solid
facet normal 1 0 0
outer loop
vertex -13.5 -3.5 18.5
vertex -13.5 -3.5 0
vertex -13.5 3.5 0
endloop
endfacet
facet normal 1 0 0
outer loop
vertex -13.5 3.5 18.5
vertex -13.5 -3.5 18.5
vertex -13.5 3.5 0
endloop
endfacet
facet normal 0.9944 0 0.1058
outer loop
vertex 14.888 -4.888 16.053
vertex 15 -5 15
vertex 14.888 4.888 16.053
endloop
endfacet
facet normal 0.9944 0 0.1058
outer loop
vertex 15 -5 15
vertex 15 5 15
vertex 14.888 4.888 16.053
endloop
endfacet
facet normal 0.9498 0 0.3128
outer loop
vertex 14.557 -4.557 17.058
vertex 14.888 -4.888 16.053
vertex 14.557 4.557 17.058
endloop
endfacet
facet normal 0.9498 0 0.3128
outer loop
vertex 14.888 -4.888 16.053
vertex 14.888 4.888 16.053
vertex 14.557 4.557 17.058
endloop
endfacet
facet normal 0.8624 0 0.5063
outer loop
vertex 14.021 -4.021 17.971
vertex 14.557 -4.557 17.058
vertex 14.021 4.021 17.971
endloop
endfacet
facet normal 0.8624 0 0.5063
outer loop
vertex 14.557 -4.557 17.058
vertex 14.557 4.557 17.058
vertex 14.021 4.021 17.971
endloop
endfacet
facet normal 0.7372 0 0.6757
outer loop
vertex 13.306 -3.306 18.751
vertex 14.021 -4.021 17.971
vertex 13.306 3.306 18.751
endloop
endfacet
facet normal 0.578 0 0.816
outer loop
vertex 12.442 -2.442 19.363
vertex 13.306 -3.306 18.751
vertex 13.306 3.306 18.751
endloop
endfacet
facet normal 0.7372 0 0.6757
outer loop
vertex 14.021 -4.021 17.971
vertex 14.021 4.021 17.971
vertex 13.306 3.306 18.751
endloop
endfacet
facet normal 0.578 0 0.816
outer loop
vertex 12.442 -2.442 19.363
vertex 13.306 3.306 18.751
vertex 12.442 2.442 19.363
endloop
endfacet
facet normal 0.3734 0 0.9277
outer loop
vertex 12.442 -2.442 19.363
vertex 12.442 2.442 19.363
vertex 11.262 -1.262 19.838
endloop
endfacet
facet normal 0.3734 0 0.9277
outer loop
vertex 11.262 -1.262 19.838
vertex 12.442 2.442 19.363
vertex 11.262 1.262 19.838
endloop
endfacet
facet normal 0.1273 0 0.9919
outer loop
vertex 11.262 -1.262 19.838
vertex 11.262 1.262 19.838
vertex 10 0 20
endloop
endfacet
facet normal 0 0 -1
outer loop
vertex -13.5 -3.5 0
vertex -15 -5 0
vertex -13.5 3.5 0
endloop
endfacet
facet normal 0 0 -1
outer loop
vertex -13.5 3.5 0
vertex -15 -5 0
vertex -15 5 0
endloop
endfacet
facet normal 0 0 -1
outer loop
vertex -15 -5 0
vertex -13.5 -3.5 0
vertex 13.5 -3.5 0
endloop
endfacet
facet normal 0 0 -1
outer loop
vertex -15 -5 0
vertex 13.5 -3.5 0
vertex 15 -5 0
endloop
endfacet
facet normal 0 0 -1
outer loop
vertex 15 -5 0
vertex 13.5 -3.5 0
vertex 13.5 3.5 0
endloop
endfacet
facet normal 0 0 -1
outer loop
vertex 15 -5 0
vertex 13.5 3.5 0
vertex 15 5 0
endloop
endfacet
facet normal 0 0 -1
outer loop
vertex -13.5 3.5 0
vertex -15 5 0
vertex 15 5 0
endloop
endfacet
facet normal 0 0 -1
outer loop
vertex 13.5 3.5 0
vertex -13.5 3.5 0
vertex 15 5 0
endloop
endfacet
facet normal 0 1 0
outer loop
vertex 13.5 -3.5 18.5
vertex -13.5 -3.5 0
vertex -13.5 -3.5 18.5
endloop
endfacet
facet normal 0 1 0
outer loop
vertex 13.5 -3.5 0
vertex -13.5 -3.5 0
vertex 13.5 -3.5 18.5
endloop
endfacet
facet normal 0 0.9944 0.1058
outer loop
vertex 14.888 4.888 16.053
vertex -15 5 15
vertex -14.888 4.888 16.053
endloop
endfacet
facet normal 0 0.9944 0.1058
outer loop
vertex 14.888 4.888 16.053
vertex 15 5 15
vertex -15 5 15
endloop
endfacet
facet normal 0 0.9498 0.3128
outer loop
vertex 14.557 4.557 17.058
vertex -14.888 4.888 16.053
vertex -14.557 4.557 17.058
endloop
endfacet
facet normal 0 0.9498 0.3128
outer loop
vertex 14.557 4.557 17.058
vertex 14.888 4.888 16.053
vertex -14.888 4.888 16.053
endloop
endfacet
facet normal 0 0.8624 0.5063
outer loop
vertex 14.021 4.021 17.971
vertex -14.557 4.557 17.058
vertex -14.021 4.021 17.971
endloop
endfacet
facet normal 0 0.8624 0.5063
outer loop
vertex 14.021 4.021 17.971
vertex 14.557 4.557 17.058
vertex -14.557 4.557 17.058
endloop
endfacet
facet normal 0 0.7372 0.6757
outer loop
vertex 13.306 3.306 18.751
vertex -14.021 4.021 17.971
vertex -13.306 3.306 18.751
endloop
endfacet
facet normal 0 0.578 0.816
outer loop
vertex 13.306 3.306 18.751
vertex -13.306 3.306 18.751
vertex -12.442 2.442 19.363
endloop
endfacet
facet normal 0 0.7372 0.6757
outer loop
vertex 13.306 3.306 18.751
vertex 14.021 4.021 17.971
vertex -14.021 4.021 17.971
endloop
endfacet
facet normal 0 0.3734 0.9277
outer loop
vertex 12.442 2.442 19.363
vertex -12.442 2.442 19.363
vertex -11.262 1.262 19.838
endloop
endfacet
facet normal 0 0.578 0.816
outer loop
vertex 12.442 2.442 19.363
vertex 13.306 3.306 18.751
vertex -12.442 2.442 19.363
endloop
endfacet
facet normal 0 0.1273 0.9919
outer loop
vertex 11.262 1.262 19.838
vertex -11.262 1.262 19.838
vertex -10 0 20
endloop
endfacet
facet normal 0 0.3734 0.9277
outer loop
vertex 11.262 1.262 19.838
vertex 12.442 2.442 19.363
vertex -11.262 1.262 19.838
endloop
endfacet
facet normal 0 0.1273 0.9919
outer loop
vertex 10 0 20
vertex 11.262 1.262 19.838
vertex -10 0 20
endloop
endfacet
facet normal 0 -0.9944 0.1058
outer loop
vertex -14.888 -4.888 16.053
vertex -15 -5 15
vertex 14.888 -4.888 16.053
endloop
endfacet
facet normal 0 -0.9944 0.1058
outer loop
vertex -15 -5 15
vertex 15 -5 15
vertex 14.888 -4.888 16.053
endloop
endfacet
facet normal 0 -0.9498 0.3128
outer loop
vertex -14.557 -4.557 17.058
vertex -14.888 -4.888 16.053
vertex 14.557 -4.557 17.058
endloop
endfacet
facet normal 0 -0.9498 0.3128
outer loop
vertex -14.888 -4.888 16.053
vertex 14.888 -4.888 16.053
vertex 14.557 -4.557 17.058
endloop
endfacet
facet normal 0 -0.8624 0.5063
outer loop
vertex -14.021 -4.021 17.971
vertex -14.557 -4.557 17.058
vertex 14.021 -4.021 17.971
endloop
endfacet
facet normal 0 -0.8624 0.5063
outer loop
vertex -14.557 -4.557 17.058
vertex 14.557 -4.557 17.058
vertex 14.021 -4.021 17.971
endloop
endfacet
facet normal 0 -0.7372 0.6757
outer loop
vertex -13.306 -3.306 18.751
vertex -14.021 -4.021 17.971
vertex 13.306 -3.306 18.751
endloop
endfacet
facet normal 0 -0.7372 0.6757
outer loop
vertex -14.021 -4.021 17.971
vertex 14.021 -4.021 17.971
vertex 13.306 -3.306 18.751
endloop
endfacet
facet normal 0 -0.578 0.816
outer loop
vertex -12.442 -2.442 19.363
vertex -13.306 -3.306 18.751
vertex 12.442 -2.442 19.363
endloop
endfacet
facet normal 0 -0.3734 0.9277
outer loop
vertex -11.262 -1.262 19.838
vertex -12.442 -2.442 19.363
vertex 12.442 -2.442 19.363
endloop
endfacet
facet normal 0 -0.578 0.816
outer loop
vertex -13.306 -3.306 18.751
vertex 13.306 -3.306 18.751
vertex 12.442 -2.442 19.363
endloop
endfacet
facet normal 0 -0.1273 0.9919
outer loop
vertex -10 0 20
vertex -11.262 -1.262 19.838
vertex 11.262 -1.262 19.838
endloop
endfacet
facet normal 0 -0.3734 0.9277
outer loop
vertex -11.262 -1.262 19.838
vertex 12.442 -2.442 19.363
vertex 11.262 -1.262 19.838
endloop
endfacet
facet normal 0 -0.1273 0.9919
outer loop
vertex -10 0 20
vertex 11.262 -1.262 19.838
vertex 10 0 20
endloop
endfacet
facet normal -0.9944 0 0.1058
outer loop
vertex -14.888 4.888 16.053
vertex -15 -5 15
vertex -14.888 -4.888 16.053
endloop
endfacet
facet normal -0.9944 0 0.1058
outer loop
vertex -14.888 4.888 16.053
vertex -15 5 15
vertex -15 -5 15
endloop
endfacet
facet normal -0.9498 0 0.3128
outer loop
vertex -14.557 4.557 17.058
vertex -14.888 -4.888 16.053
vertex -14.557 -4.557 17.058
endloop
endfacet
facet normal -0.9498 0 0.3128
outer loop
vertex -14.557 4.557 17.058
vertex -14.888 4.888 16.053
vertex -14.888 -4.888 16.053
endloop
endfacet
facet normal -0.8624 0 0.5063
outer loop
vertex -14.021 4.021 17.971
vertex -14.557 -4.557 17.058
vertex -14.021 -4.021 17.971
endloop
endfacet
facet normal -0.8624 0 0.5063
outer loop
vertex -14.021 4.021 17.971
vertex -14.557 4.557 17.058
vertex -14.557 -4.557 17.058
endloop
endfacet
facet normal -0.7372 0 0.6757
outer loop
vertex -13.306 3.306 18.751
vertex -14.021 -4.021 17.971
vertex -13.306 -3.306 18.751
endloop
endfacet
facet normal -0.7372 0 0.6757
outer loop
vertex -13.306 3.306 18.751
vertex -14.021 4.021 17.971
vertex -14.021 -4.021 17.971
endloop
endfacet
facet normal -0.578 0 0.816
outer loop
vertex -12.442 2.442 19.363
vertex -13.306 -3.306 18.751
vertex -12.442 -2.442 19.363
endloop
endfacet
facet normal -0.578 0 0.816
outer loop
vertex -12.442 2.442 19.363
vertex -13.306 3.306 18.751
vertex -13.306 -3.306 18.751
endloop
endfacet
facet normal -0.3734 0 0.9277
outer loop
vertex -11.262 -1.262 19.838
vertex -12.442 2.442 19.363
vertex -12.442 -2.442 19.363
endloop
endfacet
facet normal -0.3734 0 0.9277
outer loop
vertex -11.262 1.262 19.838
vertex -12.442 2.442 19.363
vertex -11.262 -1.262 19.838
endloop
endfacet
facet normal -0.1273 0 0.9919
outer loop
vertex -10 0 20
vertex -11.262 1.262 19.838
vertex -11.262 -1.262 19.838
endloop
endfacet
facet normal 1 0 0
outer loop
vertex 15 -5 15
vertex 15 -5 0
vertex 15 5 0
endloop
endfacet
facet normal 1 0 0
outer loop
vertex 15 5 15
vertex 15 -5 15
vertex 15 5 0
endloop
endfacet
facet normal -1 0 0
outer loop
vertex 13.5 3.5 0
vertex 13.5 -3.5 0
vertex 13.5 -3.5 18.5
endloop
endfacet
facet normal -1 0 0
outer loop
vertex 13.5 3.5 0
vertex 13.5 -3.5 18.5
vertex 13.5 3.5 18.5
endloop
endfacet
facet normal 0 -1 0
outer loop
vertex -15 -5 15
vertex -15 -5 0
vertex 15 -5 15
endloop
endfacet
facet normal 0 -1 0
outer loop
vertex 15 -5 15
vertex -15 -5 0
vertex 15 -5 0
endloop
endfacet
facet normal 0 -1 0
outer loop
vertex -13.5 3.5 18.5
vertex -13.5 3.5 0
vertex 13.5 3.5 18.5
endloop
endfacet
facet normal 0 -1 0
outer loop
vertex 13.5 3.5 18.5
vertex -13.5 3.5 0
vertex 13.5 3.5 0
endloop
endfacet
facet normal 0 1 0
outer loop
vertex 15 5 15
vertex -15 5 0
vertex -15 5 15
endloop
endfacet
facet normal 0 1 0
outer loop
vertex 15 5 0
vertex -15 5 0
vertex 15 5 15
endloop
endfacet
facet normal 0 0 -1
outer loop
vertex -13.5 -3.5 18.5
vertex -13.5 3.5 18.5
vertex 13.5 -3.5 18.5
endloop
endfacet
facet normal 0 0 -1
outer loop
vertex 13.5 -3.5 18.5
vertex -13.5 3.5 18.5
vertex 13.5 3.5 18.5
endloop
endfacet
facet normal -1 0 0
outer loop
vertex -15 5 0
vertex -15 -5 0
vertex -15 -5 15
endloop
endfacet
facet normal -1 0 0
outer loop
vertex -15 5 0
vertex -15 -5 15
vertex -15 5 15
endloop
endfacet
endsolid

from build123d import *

# Parameters (mm, degrees)
F0_W     = 30
F0_H     = 10
F1_DEPTH = 20
F2_T     = -1.5
F3_R     = 4.99999


# Not quite as in the source:
# - a fillet or chamfer is up to 0.001 mm smaller than in the source, because OpenCascade refuses the exact size


with BuildPart() as f1:
    # F0 (on Top) → F1 (new body)
    with BuildSketch(Plane.XY):
        Rectangle(F0_W, F0_H)
    extrude(amount=F1_DEPTH)

    # F2
    f2_openings = [f1.faces().sort_by_distance(p)[0] for p in [
        (0, 0, 0),
    ]]
    offset(amount=F2_T, openings=f2_openings)

    # F3 (radius 5 in the source; OpenCascade refuses exactly that, so slightly less here)
    f3_edges = [f1.edges().sort_by_distance(p)[0] for p in [
        (-15, 0, 20),
        (0, -5, 20),
        (0, 5, 20),
        (15, 0, 20),
    ]]
    fillet(f3_edges, radius=F3_R)


solid = f1.part
